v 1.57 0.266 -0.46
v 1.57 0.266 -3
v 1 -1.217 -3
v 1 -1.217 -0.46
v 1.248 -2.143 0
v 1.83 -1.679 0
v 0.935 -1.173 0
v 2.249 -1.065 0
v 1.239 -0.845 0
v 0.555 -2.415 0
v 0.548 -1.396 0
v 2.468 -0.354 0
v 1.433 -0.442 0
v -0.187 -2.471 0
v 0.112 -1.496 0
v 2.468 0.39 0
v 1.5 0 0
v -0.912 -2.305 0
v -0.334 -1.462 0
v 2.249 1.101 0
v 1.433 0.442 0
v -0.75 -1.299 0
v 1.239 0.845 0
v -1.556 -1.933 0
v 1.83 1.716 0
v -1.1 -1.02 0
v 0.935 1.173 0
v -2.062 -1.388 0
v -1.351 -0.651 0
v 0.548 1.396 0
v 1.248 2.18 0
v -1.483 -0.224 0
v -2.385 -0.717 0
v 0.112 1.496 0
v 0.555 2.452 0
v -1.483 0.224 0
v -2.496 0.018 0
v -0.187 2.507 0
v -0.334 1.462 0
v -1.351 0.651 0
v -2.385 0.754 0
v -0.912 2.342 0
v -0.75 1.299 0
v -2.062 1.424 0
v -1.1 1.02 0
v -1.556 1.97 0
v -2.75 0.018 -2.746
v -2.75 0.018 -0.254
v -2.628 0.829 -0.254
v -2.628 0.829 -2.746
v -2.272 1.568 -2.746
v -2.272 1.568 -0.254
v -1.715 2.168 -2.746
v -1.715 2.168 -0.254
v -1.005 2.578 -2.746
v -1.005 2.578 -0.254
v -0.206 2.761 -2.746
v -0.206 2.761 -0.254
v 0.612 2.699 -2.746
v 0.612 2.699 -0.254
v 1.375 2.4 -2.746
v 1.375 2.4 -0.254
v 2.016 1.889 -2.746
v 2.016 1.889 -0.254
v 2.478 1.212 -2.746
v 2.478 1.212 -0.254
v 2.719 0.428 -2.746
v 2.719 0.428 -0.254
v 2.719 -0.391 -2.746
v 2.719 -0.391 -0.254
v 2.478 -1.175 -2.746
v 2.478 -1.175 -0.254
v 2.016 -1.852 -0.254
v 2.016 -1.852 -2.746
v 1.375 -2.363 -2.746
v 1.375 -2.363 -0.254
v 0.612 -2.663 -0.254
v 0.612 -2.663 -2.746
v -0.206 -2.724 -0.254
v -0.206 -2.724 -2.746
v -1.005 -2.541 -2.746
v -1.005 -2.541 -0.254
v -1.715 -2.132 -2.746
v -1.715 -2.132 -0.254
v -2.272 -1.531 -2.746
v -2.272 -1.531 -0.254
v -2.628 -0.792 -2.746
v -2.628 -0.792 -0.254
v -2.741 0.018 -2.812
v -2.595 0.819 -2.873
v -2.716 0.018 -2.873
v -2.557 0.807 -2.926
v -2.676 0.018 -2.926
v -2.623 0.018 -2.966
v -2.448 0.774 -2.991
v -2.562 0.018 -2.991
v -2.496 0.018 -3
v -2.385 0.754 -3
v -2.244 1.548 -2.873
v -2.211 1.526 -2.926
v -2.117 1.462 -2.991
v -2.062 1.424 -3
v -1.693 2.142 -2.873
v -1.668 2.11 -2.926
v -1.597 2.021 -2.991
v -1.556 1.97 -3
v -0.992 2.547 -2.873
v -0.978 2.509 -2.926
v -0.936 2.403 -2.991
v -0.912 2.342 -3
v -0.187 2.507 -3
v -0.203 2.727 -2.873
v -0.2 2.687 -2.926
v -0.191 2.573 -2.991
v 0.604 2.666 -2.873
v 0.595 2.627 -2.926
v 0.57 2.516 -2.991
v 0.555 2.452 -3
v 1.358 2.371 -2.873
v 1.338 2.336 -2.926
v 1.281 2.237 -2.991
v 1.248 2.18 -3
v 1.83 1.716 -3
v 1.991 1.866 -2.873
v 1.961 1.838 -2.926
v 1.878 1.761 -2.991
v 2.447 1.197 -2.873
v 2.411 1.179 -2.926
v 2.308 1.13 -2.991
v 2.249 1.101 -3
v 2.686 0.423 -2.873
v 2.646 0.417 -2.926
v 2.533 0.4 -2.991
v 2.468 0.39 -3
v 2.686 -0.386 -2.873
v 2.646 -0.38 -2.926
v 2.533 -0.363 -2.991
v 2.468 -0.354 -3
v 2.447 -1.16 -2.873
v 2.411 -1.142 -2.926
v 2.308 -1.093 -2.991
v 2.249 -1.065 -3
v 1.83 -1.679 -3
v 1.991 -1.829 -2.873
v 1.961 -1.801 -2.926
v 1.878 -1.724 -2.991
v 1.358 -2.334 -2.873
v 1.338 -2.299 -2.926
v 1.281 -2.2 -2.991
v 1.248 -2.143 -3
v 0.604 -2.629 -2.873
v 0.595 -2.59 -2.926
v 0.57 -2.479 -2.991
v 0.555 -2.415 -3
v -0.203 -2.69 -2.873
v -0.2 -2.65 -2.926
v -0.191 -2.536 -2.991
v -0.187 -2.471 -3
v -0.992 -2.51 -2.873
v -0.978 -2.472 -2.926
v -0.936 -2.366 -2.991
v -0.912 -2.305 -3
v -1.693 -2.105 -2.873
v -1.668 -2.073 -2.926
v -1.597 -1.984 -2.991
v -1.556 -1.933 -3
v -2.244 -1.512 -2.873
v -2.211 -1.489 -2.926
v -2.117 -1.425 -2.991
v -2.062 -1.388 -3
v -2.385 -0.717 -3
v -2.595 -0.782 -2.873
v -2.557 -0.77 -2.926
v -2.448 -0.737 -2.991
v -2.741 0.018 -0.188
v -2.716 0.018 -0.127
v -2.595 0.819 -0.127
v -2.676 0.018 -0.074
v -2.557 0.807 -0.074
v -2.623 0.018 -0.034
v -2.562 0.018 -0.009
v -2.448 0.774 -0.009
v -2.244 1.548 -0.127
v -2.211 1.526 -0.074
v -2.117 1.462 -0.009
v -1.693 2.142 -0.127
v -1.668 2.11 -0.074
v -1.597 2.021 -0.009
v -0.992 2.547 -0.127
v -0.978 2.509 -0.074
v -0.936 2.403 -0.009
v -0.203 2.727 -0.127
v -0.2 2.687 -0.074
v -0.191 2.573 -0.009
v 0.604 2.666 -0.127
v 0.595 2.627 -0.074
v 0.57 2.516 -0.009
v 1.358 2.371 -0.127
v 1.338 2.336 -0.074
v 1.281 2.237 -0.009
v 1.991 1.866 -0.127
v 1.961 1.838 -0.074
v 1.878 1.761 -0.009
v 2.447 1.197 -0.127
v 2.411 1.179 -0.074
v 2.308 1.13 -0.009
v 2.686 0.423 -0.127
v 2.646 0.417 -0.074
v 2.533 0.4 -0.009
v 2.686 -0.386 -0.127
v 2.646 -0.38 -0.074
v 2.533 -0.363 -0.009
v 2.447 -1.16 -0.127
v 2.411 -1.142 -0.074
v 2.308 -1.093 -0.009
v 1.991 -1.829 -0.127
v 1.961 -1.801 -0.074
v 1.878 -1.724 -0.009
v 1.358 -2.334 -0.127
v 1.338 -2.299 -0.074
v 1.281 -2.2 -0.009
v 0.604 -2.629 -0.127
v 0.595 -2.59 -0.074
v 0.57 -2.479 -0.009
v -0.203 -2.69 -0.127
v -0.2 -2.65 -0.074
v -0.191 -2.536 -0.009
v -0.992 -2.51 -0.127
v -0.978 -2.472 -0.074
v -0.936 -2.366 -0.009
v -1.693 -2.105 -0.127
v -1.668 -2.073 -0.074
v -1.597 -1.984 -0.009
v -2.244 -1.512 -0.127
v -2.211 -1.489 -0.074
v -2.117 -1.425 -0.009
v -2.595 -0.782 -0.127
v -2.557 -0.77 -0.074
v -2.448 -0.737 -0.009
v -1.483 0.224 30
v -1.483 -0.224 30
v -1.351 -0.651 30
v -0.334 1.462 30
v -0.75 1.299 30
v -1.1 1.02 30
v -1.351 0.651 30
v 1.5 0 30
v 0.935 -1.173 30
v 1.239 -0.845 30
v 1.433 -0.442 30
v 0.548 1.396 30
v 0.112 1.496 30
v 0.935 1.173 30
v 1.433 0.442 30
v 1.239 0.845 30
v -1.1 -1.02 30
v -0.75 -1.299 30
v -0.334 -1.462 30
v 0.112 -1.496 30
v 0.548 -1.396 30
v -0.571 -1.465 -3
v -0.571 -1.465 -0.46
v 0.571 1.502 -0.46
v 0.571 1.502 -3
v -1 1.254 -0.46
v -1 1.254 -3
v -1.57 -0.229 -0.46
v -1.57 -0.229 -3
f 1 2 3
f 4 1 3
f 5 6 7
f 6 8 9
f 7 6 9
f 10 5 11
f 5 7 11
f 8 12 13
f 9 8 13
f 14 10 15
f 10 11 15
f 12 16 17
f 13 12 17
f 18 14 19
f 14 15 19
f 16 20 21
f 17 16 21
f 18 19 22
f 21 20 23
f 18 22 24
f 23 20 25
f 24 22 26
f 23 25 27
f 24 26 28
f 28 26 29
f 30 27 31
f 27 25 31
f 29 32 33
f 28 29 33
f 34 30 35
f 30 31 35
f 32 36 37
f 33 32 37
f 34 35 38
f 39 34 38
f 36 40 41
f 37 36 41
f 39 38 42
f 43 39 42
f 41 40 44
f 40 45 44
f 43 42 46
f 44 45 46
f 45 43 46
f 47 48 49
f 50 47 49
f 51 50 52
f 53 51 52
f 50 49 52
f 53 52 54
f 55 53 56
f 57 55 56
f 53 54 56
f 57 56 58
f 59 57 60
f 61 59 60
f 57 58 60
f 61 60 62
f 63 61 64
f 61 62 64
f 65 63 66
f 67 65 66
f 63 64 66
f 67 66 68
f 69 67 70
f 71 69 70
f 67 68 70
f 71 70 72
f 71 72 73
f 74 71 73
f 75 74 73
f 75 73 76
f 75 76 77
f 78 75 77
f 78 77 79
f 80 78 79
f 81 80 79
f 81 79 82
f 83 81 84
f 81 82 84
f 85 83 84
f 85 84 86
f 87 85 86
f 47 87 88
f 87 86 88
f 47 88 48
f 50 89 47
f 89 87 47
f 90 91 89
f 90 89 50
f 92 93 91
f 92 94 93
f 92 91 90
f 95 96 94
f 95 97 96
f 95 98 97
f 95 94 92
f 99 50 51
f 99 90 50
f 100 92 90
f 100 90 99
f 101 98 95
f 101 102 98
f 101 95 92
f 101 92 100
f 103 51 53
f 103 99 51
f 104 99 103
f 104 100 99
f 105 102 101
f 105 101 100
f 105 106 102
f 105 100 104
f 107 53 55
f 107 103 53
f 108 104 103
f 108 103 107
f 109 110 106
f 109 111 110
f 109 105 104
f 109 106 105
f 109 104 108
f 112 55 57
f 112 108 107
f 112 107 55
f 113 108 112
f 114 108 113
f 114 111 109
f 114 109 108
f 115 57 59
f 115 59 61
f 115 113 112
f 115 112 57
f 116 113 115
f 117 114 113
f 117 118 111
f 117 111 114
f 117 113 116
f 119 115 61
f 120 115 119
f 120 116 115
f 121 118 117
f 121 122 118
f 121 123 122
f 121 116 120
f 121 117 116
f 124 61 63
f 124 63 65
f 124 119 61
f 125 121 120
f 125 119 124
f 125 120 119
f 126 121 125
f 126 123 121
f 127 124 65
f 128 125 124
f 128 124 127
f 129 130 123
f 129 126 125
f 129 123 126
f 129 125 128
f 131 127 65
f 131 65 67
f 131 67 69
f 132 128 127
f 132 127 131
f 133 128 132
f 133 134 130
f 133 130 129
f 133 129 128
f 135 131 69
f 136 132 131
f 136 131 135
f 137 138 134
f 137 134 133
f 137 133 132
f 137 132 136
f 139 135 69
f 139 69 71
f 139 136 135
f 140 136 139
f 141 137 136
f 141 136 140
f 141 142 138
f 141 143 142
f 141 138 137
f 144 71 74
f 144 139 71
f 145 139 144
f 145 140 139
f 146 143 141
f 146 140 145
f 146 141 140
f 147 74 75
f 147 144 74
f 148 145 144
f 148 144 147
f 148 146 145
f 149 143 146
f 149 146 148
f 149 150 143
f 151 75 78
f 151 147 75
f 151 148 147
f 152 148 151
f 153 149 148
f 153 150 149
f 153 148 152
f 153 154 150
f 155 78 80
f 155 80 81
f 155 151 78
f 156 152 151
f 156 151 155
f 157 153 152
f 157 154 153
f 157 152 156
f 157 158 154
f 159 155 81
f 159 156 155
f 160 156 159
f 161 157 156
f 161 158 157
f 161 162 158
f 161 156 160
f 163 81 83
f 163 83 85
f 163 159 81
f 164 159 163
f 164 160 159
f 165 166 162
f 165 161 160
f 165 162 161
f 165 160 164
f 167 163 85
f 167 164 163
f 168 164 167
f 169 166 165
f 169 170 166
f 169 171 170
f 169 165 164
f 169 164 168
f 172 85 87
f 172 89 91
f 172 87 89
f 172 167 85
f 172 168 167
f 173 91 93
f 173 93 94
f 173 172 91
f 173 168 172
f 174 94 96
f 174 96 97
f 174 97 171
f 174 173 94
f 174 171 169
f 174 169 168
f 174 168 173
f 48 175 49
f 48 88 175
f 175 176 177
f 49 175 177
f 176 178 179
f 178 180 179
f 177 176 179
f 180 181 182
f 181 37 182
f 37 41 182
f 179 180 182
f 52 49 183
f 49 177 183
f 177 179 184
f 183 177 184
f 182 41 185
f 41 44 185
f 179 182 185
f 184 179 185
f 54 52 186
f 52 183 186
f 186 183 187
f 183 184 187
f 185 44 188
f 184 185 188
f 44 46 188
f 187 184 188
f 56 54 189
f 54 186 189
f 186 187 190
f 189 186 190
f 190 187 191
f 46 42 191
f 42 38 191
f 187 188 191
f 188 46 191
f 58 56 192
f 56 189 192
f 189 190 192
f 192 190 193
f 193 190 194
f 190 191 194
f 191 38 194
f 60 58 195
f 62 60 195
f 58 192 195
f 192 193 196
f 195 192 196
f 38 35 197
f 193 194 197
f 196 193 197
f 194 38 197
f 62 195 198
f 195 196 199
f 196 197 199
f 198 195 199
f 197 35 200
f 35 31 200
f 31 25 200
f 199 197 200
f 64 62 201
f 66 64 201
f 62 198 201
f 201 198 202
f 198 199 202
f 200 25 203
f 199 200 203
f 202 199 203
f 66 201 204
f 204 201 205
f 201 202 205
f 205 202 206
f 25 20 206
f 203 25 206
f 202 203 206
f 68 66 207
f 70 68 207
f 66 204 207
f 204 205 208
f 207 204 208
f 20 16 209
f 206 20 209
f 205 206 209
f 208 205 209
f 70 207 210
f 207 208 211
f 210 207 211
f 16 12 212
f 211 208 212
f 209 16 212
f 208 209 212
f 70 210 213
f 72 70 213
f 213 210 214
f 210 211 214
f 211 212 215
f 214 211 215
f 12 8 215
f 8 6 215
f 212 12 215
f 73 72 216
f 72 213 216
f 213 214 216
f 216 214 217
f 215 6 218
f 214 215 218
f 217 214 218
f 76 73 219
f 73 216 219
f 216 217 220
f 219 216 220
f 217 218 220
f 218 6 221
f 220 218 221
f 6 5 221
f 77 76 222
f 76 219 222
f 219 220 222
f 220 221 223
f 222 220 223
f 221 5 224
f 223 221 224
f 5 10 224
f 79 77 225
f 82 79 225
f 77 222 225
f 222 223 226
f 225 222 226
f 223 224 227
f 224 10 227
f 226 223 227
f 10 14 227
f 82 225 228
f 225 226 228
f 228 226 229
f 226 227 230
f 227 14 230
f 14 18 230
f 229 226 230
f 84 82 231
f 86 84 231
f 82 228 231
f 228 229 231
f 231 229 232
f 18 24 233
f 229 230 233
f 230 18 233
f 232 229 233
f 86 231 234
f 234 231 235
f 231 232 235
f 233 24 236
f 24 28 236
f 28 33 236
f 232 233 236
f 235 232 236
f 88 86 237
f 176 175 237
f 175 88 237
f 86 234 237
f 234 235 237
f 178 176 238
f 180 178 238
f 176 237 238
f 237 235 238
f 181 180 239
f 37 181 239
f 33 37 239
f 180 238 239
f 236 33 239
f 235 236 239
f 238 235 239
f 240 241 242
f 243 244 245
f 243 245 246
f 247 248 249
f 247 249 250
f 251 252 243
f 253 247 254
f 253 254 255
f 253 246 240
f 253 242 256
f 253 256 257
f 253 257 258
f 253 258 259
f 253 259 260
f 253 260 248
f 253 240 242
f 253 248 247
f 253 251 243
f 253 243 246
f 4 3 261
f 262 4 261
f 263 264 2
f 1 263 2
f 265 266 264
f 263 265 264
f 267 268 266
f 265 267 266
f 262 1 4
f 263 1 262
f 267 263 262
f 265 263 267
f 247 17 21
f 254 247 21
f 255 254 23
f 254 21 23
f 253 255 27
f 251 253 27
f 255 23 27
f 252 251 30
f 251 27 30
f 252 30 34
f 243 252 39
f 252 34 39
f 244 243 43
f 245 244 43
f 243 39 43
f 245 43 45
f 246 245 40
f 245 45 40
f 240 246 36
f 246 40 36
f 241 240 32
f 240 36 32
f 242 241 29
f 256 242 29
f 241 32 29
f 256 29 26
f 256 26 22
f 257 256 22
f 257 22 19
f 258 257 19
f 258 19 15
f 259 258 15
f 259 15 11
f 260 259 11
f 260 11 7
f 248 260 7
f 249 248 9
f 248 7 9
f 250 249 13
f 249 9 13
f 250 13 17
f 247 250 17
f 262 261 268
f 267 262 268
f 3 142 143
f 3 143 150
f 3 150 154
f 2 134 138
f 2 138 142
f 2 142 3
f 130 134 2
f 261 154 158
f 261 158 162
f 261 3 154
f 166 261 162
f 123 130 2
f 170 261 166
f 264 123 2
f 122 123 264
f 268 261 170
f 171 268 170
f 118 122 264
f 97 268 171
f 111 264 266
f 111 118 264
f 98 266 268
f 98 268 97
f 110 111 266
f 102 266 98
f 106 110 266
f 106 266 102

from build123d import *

# Parameters (mm, degrees)
SKETCH1_R           = 1.5
BOSS_EXTRUDE1_DEPTH = 30
SKETCH2_R           = 2.75
BOSS_EXTRUDE2_DEPTH = 3
FILLET1_R           = 0.254
CUT_EXTRUDE1_DEPTH  = 2.54


with BuildPart() as part:
    # Sketch1 → Boss-Extrude1 (new body)
    with BuildSketch(Plane.XY):
        Circle(SKETCH1_R)
    extrude(amount=BOSS_EXTRUDE1_DEPTH)

    # Sketch2 → Boss-Extrude2 (add)
    with BuildSketch(Plane(origin=(0, 0, 0), x_dir=(-1, 0, 0), z_dir=(0, 0, -1))):
        with Locations((0, 0.018427268)):
            Circle(SKETCH2_R)
    extrude(amount=BOSS_EXTRUDE2_DEPTH)

    # Fillet1
    fillet1_edges = [part.edges().sort_by_distance(p)[0] for p in [
        (2.75, 0.018427268, 0),
        (2.75, 0.018427268, -3),
    ]]
    fillet(fillet1_edges, radius=FILLET1_R)

    # Sketch3 → Cut-Extrude1 (cut)
    with BuildSketch(Plane(origin=(0, 0, -3), x_dir=(-1, 0, 0), z_dir=(0, 0, -1))):
        Polygon((1.570116236, -0.229317517), (0.999611396, 1.254315423), (-0.57050484, 1.502060208), (-1.570116236, 0.266172054), (-0.999611396, -1.217460886), (0.57050484, -1.465205671), align=None)
    extrude(amount=-CUT_EXTRUDE1_DEPTH, mode=Mode.SUBTRACT)


solid = part.part
